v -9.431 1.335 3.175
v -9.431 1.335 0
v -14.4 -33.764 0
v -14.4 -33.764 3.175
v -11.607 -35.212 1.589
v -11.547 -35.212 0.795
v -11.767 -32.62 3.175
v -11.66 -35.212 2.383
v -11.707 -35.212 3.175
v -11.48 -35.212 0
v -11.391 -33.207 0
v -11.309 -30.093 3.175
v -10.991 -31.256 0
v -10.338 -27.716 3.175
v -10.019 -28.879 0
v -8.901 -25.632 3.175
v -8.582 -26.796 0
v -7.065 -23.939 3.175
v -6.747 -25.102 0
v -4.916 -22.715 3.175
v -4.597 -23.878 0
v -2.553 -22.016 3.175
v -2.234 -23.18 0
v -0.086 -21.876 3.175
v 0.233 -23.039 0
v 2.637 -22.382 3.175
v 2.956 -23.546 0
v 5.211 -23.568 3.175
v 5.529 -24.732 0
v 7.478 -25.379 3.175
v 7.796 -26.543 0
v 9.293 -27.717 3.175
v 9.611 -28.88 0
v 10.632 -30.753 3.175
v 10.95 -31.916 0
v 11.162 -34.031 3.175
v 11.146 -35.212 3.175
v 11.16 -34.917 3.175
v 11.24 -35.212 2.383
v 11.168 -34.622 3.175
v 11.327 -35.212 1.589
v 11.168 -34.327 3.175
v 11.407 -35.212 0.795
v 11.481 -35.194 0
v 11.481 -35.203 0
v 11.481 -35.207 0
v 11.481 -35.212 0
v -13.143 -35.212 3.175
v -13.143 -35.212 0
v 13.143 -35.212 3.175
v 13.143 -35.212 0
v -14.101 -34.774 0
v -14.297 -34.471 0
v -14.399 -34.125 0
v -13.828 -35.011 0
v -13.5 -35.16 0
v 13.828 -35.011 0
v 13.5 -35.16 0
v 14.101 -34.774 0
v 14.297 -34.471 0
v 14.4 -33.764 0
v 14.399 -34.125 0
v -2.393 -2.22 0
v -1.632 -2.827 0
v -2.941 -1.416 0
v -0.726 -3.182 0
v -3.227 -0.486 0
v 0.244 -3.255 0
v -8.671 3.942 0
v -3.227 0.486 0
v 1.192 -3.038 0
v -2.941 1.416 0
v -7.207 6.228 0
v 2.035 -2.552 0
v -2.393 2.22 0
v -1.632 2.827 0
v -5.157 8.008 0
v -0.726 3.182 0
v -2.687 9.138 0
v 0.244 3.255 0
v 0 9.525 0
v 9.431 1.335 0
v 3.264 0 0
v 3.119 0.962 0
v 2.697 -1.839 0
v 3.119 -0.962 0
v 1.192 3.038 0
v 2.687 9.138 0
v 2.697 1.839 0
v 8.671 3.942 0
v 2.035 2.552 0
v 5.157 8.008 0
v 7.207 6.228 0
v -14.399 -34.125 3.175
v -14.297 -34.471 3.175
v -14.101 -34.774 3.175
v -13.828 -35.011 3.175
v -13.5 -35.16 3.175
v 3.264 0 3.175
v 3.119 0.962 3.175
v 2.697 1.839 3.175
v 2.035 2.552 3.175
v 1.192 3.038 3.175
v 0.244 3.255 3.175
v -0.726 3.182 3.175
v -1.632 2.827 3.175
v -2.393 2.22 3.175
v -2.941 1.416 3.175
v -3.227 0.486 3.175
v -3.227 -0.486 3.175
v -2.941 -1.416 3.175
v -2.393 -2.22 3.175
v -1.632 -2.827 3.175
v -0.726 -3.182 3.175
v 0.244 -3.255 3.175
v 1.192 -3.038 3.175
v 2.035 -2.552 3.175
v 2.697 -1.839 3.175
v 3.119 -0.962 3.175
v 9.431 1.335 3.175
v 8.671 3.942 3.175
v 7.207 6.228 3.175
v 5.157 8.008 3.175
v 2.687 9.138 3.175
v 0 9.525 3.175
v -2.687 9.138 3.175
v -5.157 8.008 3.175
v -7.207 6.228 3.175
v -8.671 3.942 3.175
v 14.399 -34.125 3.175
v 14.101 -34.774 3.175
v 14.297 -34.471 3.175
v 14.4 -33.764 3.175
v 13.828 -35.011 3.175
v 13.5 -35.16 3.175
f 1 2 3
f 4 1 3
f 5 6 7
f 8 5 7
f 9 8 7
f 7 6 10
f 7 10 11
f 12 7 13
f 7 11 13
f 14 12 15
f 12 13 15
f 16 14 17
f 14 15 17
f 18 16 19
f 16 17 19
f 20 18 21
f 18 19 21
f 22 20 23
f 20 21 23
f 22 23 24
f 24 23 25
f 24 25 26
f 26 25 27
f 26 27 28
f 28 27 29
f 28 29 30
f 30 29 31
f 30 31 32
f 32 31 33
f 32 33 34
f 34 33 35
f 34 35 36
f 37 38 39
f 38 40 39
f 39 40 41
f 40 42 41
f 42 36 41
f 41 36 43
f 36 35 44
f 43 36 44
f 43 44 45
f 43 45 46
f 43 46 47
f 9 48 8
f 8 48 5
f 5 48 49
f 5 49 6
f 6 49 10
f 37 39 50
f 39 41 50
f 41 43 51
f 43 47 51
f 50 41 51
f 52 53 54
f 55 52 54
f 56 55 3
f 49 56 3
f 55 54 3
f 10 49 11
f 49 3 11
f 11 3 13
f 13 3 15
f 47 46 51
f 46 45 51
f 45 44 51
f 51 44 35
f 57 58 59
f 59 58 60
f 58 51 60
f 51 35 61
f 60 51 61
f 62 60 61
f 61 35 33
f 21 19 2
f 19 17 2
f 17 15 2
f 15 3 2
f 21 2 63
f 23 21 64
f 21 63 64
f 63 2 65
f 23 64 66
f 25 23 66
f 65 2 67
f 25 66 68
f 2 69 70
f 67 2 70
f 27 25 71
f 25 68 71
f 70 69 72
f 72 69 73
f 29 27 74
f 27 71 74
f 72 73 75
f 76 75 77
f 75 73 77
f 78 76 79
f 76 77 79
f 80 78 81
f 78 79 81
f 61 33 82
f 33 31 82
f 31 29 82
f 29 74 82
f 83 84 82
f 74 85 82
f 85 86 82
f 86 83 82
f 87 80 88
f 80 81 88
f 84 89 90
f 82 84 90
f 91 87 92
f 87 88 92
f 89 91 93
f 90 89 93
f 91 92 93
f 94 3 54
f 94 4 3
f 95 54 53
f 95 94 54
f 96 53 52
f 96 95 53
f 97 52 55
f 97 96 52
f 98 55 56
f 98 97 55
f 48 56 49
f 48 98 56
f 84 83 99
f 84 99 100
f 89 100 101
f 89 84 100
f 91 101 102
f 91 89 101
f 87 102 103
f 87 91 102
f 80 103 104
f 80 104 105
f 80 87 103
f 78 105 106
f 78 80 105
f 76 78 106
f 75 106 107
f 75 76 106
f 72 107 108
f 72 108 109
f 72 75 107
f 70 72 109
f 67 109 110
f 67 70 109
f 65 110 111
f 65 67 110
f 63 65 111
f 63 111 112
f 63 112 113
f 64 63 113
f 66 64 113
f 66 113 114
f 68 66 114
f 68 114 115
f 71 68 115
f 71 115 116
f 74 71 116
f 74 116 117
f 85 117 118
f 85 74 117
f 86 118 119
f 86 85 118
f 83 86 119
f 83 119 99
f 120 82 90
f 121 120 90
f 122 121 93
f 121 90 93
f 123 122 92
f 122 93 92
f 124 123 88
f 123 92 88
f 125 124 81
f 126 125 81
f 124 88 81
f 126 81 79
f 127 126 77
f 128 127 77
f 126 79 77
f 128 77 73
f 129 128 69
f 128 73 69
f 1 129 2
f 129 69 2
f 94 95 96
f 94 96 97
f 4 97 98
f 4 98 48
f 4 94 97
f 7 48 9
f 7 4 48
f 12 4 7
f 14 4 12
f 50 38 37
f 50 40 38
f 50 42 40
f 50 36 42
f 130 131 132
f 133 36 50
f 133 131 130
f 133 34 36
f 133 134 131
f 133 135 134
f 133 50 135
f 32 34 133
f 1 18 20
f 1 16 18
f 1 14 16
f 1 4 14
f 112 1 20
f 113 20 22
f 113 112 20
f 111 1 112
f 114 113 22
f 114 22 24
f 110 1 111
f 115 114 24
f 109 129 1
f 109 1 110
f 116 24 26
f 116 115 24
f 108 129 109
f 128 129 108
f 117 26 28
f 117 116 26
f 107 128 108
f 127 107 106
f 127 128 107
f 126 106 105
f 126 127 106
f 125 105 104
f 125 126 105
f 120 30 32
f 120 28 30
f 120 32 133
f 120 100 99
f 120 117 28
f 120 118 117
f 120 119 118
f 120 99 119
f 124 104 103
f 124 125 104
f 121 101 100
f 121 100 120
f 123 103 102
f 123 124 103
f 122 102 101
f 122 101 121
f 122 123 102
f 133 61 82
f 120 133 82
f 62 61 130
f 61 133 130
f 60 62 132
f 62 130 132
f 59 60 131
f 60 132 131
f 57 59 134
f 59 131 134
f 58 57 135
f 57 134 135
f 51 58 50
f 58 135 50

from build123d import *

# Parameters (mm, degrees)
SKETCH1_R           = 3.2639
BOSS_EXTRUDE1_DEPTH = 3.175
CAVITY1_OUTLINE_W   = 11.43
CAVITY1_OUTLINE_H   = 8.831388176
FILLET3_R           = 1.27


# Read off the part's stored shape, not the designer's step: Cavity1
with BuildPart() as part:
    # Sketch1 → Boss-Extrude1 (new body)
    with BuildSketch(Plane.XY):
        with BuildLine():
            ThreePointArc((9.430957534, 1.335164779), (0, 9.525), (-9.430957534, 1.335164779))
            Line((-9.430957534, 1.335164779), (-14.605, -35.211766))
            Line((-14.605, -35.211766), (14.605, -35.211766))
            Line((14.605, -35.211766), (9.430957534, 1.335164779))
        make_face()
        Circle(SKETCH1_R, mode=Mode.SUBTRACT)
    extrude(amount=BOSS_EXTRUDE1_DEPTH)

    # Cavity1 outline → Cavity1 (revolve, cut)
    with BuildSketch(Plane(origin=(-1.130247142, -31.06550514, 11.268870294), x_dir=(0.995594734936216, 0.03225653994771549, 0.08803771576936452), z_dir=(0, 0.9389588693345029, -0.34402941981474794))):
        with Locations((5.715, 8.721306361)):
            Rectangle(CAVITY1_OUTLINE_W, CAVITY1_OUTLINE_H)
    revolve(axis=Axis((-1.130247142, -31.06550514, 11.268870294), (0.09376099278103864, -0.34251387903072417, -0.9348225066310935)), mode=Mode.SUBTRACT)

    # Fillet3
    fillet3_edges = [part.edges().sort_by_distance(p)[0] for p in [
        (-14.605, -35.211766, 1.5875),
        (14.605, -35.211766, 1.5875),
    ]]
    fillet(fillet3_edges, radius=FILLET3_R)


solid = part.part
